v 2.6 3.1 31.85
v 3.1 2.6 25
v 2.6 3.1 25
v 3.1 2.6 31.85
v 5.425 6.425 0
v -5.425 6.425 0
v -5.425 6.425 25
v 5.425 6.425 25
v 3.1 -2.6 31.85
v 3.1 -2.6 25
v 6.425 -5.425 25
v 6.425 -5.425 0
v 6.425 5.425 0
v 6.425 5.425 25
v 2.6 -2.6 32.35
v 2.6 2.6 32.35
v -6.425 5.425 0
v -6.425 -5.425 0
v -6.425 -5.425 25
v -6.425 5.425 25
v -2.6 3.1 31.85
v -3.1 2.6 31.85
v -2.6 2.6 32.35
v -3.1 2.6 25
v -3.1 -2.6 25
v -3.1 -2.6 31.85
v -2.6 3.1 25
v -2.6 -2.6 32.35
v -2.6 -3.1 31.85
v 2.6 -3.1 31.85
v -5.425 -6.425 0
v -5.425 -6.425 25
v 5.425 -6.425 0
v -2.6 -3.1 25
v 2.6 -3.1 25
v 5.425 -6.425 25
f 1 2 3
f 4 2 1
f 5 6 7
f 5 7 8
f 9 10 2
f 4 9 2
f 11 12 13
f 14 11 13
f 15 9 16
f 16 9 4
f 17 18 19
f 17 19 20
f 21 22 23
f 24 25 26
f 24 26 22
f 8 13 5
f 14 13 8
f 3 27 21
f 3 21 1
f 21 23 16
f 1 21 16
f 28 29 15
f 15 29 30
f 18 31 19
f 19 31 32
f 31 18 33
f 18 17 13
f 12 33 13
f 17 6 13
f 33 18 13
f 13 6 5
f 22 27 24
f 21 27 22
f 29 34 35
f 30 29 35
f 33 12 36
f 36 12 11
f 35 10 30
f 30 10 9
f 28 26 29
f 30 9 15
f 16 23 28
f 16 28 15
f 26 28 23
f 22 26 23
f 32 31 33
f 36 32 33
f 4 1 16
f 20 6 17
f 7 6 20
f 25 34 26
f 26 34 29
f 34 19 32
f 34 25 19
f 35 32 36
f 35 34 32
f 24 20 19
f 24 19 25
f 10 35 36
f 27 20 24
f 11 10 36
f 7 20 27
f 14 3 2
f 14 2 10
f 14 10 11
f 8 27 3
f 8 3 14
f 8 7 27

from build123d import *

# Parameters (mm, degrees)
F0_W     = 12.85
F0_H     = 12.85
F0_W_2   = 6.2
F0_H_2   = 6.2
F1_DEPTH = 25
F2_DEPTH = 32.35
F3_SIZE  = 0.5
F4_SIZE  = 1


with BuildPart() as f1:
    # F0 (on Top) → F1 (new body)
    with BuildSketch(Plane.XY):
        Rectangle(F0_W, F0_H)
        Rectangle(F0_W_2, F0_H_2, mode=Mode.SUBTRACT)
    extrude(amount=F1_DEPTH)

    # F0 (on Top) → F2 (join)
    with BuildSketch(Plane.XY):
        Rectangle(F0_W_2, F0_H_2)
    extrude(amount=F2_DEPTH)

    # F3
    f3_edges = [f1.edges().sort_by_distance(p)[0] for p in [
        (3.1, -3.1, 28.675),
        (3.1, 3.1, 28.675),
        (-3.1, -3.1, 28.675),
        (-3.1, 3.1, 28.675),
        (-3.1, 0, 32.35),
        (0, 3.1, 32.35),
        (3.1, 0, 32.35),
        (0, -3.1, 32.35),
    ]]
    chamfer(f3_edges, length=F3_SIZE)

    # F4
    f4_edges = [f1.edges().sort_by_distance(p)[0] for p in [
        (-6.425, -6.425, 12.5),
        (-6.425, 6.425, 12.5),
        (6.425, 6.425, 12.5),
        (6.425, -6.425, 12.5),
    ]]
    chamfer(f4_edges, length=F4_SIZE)


solid = f1.part
